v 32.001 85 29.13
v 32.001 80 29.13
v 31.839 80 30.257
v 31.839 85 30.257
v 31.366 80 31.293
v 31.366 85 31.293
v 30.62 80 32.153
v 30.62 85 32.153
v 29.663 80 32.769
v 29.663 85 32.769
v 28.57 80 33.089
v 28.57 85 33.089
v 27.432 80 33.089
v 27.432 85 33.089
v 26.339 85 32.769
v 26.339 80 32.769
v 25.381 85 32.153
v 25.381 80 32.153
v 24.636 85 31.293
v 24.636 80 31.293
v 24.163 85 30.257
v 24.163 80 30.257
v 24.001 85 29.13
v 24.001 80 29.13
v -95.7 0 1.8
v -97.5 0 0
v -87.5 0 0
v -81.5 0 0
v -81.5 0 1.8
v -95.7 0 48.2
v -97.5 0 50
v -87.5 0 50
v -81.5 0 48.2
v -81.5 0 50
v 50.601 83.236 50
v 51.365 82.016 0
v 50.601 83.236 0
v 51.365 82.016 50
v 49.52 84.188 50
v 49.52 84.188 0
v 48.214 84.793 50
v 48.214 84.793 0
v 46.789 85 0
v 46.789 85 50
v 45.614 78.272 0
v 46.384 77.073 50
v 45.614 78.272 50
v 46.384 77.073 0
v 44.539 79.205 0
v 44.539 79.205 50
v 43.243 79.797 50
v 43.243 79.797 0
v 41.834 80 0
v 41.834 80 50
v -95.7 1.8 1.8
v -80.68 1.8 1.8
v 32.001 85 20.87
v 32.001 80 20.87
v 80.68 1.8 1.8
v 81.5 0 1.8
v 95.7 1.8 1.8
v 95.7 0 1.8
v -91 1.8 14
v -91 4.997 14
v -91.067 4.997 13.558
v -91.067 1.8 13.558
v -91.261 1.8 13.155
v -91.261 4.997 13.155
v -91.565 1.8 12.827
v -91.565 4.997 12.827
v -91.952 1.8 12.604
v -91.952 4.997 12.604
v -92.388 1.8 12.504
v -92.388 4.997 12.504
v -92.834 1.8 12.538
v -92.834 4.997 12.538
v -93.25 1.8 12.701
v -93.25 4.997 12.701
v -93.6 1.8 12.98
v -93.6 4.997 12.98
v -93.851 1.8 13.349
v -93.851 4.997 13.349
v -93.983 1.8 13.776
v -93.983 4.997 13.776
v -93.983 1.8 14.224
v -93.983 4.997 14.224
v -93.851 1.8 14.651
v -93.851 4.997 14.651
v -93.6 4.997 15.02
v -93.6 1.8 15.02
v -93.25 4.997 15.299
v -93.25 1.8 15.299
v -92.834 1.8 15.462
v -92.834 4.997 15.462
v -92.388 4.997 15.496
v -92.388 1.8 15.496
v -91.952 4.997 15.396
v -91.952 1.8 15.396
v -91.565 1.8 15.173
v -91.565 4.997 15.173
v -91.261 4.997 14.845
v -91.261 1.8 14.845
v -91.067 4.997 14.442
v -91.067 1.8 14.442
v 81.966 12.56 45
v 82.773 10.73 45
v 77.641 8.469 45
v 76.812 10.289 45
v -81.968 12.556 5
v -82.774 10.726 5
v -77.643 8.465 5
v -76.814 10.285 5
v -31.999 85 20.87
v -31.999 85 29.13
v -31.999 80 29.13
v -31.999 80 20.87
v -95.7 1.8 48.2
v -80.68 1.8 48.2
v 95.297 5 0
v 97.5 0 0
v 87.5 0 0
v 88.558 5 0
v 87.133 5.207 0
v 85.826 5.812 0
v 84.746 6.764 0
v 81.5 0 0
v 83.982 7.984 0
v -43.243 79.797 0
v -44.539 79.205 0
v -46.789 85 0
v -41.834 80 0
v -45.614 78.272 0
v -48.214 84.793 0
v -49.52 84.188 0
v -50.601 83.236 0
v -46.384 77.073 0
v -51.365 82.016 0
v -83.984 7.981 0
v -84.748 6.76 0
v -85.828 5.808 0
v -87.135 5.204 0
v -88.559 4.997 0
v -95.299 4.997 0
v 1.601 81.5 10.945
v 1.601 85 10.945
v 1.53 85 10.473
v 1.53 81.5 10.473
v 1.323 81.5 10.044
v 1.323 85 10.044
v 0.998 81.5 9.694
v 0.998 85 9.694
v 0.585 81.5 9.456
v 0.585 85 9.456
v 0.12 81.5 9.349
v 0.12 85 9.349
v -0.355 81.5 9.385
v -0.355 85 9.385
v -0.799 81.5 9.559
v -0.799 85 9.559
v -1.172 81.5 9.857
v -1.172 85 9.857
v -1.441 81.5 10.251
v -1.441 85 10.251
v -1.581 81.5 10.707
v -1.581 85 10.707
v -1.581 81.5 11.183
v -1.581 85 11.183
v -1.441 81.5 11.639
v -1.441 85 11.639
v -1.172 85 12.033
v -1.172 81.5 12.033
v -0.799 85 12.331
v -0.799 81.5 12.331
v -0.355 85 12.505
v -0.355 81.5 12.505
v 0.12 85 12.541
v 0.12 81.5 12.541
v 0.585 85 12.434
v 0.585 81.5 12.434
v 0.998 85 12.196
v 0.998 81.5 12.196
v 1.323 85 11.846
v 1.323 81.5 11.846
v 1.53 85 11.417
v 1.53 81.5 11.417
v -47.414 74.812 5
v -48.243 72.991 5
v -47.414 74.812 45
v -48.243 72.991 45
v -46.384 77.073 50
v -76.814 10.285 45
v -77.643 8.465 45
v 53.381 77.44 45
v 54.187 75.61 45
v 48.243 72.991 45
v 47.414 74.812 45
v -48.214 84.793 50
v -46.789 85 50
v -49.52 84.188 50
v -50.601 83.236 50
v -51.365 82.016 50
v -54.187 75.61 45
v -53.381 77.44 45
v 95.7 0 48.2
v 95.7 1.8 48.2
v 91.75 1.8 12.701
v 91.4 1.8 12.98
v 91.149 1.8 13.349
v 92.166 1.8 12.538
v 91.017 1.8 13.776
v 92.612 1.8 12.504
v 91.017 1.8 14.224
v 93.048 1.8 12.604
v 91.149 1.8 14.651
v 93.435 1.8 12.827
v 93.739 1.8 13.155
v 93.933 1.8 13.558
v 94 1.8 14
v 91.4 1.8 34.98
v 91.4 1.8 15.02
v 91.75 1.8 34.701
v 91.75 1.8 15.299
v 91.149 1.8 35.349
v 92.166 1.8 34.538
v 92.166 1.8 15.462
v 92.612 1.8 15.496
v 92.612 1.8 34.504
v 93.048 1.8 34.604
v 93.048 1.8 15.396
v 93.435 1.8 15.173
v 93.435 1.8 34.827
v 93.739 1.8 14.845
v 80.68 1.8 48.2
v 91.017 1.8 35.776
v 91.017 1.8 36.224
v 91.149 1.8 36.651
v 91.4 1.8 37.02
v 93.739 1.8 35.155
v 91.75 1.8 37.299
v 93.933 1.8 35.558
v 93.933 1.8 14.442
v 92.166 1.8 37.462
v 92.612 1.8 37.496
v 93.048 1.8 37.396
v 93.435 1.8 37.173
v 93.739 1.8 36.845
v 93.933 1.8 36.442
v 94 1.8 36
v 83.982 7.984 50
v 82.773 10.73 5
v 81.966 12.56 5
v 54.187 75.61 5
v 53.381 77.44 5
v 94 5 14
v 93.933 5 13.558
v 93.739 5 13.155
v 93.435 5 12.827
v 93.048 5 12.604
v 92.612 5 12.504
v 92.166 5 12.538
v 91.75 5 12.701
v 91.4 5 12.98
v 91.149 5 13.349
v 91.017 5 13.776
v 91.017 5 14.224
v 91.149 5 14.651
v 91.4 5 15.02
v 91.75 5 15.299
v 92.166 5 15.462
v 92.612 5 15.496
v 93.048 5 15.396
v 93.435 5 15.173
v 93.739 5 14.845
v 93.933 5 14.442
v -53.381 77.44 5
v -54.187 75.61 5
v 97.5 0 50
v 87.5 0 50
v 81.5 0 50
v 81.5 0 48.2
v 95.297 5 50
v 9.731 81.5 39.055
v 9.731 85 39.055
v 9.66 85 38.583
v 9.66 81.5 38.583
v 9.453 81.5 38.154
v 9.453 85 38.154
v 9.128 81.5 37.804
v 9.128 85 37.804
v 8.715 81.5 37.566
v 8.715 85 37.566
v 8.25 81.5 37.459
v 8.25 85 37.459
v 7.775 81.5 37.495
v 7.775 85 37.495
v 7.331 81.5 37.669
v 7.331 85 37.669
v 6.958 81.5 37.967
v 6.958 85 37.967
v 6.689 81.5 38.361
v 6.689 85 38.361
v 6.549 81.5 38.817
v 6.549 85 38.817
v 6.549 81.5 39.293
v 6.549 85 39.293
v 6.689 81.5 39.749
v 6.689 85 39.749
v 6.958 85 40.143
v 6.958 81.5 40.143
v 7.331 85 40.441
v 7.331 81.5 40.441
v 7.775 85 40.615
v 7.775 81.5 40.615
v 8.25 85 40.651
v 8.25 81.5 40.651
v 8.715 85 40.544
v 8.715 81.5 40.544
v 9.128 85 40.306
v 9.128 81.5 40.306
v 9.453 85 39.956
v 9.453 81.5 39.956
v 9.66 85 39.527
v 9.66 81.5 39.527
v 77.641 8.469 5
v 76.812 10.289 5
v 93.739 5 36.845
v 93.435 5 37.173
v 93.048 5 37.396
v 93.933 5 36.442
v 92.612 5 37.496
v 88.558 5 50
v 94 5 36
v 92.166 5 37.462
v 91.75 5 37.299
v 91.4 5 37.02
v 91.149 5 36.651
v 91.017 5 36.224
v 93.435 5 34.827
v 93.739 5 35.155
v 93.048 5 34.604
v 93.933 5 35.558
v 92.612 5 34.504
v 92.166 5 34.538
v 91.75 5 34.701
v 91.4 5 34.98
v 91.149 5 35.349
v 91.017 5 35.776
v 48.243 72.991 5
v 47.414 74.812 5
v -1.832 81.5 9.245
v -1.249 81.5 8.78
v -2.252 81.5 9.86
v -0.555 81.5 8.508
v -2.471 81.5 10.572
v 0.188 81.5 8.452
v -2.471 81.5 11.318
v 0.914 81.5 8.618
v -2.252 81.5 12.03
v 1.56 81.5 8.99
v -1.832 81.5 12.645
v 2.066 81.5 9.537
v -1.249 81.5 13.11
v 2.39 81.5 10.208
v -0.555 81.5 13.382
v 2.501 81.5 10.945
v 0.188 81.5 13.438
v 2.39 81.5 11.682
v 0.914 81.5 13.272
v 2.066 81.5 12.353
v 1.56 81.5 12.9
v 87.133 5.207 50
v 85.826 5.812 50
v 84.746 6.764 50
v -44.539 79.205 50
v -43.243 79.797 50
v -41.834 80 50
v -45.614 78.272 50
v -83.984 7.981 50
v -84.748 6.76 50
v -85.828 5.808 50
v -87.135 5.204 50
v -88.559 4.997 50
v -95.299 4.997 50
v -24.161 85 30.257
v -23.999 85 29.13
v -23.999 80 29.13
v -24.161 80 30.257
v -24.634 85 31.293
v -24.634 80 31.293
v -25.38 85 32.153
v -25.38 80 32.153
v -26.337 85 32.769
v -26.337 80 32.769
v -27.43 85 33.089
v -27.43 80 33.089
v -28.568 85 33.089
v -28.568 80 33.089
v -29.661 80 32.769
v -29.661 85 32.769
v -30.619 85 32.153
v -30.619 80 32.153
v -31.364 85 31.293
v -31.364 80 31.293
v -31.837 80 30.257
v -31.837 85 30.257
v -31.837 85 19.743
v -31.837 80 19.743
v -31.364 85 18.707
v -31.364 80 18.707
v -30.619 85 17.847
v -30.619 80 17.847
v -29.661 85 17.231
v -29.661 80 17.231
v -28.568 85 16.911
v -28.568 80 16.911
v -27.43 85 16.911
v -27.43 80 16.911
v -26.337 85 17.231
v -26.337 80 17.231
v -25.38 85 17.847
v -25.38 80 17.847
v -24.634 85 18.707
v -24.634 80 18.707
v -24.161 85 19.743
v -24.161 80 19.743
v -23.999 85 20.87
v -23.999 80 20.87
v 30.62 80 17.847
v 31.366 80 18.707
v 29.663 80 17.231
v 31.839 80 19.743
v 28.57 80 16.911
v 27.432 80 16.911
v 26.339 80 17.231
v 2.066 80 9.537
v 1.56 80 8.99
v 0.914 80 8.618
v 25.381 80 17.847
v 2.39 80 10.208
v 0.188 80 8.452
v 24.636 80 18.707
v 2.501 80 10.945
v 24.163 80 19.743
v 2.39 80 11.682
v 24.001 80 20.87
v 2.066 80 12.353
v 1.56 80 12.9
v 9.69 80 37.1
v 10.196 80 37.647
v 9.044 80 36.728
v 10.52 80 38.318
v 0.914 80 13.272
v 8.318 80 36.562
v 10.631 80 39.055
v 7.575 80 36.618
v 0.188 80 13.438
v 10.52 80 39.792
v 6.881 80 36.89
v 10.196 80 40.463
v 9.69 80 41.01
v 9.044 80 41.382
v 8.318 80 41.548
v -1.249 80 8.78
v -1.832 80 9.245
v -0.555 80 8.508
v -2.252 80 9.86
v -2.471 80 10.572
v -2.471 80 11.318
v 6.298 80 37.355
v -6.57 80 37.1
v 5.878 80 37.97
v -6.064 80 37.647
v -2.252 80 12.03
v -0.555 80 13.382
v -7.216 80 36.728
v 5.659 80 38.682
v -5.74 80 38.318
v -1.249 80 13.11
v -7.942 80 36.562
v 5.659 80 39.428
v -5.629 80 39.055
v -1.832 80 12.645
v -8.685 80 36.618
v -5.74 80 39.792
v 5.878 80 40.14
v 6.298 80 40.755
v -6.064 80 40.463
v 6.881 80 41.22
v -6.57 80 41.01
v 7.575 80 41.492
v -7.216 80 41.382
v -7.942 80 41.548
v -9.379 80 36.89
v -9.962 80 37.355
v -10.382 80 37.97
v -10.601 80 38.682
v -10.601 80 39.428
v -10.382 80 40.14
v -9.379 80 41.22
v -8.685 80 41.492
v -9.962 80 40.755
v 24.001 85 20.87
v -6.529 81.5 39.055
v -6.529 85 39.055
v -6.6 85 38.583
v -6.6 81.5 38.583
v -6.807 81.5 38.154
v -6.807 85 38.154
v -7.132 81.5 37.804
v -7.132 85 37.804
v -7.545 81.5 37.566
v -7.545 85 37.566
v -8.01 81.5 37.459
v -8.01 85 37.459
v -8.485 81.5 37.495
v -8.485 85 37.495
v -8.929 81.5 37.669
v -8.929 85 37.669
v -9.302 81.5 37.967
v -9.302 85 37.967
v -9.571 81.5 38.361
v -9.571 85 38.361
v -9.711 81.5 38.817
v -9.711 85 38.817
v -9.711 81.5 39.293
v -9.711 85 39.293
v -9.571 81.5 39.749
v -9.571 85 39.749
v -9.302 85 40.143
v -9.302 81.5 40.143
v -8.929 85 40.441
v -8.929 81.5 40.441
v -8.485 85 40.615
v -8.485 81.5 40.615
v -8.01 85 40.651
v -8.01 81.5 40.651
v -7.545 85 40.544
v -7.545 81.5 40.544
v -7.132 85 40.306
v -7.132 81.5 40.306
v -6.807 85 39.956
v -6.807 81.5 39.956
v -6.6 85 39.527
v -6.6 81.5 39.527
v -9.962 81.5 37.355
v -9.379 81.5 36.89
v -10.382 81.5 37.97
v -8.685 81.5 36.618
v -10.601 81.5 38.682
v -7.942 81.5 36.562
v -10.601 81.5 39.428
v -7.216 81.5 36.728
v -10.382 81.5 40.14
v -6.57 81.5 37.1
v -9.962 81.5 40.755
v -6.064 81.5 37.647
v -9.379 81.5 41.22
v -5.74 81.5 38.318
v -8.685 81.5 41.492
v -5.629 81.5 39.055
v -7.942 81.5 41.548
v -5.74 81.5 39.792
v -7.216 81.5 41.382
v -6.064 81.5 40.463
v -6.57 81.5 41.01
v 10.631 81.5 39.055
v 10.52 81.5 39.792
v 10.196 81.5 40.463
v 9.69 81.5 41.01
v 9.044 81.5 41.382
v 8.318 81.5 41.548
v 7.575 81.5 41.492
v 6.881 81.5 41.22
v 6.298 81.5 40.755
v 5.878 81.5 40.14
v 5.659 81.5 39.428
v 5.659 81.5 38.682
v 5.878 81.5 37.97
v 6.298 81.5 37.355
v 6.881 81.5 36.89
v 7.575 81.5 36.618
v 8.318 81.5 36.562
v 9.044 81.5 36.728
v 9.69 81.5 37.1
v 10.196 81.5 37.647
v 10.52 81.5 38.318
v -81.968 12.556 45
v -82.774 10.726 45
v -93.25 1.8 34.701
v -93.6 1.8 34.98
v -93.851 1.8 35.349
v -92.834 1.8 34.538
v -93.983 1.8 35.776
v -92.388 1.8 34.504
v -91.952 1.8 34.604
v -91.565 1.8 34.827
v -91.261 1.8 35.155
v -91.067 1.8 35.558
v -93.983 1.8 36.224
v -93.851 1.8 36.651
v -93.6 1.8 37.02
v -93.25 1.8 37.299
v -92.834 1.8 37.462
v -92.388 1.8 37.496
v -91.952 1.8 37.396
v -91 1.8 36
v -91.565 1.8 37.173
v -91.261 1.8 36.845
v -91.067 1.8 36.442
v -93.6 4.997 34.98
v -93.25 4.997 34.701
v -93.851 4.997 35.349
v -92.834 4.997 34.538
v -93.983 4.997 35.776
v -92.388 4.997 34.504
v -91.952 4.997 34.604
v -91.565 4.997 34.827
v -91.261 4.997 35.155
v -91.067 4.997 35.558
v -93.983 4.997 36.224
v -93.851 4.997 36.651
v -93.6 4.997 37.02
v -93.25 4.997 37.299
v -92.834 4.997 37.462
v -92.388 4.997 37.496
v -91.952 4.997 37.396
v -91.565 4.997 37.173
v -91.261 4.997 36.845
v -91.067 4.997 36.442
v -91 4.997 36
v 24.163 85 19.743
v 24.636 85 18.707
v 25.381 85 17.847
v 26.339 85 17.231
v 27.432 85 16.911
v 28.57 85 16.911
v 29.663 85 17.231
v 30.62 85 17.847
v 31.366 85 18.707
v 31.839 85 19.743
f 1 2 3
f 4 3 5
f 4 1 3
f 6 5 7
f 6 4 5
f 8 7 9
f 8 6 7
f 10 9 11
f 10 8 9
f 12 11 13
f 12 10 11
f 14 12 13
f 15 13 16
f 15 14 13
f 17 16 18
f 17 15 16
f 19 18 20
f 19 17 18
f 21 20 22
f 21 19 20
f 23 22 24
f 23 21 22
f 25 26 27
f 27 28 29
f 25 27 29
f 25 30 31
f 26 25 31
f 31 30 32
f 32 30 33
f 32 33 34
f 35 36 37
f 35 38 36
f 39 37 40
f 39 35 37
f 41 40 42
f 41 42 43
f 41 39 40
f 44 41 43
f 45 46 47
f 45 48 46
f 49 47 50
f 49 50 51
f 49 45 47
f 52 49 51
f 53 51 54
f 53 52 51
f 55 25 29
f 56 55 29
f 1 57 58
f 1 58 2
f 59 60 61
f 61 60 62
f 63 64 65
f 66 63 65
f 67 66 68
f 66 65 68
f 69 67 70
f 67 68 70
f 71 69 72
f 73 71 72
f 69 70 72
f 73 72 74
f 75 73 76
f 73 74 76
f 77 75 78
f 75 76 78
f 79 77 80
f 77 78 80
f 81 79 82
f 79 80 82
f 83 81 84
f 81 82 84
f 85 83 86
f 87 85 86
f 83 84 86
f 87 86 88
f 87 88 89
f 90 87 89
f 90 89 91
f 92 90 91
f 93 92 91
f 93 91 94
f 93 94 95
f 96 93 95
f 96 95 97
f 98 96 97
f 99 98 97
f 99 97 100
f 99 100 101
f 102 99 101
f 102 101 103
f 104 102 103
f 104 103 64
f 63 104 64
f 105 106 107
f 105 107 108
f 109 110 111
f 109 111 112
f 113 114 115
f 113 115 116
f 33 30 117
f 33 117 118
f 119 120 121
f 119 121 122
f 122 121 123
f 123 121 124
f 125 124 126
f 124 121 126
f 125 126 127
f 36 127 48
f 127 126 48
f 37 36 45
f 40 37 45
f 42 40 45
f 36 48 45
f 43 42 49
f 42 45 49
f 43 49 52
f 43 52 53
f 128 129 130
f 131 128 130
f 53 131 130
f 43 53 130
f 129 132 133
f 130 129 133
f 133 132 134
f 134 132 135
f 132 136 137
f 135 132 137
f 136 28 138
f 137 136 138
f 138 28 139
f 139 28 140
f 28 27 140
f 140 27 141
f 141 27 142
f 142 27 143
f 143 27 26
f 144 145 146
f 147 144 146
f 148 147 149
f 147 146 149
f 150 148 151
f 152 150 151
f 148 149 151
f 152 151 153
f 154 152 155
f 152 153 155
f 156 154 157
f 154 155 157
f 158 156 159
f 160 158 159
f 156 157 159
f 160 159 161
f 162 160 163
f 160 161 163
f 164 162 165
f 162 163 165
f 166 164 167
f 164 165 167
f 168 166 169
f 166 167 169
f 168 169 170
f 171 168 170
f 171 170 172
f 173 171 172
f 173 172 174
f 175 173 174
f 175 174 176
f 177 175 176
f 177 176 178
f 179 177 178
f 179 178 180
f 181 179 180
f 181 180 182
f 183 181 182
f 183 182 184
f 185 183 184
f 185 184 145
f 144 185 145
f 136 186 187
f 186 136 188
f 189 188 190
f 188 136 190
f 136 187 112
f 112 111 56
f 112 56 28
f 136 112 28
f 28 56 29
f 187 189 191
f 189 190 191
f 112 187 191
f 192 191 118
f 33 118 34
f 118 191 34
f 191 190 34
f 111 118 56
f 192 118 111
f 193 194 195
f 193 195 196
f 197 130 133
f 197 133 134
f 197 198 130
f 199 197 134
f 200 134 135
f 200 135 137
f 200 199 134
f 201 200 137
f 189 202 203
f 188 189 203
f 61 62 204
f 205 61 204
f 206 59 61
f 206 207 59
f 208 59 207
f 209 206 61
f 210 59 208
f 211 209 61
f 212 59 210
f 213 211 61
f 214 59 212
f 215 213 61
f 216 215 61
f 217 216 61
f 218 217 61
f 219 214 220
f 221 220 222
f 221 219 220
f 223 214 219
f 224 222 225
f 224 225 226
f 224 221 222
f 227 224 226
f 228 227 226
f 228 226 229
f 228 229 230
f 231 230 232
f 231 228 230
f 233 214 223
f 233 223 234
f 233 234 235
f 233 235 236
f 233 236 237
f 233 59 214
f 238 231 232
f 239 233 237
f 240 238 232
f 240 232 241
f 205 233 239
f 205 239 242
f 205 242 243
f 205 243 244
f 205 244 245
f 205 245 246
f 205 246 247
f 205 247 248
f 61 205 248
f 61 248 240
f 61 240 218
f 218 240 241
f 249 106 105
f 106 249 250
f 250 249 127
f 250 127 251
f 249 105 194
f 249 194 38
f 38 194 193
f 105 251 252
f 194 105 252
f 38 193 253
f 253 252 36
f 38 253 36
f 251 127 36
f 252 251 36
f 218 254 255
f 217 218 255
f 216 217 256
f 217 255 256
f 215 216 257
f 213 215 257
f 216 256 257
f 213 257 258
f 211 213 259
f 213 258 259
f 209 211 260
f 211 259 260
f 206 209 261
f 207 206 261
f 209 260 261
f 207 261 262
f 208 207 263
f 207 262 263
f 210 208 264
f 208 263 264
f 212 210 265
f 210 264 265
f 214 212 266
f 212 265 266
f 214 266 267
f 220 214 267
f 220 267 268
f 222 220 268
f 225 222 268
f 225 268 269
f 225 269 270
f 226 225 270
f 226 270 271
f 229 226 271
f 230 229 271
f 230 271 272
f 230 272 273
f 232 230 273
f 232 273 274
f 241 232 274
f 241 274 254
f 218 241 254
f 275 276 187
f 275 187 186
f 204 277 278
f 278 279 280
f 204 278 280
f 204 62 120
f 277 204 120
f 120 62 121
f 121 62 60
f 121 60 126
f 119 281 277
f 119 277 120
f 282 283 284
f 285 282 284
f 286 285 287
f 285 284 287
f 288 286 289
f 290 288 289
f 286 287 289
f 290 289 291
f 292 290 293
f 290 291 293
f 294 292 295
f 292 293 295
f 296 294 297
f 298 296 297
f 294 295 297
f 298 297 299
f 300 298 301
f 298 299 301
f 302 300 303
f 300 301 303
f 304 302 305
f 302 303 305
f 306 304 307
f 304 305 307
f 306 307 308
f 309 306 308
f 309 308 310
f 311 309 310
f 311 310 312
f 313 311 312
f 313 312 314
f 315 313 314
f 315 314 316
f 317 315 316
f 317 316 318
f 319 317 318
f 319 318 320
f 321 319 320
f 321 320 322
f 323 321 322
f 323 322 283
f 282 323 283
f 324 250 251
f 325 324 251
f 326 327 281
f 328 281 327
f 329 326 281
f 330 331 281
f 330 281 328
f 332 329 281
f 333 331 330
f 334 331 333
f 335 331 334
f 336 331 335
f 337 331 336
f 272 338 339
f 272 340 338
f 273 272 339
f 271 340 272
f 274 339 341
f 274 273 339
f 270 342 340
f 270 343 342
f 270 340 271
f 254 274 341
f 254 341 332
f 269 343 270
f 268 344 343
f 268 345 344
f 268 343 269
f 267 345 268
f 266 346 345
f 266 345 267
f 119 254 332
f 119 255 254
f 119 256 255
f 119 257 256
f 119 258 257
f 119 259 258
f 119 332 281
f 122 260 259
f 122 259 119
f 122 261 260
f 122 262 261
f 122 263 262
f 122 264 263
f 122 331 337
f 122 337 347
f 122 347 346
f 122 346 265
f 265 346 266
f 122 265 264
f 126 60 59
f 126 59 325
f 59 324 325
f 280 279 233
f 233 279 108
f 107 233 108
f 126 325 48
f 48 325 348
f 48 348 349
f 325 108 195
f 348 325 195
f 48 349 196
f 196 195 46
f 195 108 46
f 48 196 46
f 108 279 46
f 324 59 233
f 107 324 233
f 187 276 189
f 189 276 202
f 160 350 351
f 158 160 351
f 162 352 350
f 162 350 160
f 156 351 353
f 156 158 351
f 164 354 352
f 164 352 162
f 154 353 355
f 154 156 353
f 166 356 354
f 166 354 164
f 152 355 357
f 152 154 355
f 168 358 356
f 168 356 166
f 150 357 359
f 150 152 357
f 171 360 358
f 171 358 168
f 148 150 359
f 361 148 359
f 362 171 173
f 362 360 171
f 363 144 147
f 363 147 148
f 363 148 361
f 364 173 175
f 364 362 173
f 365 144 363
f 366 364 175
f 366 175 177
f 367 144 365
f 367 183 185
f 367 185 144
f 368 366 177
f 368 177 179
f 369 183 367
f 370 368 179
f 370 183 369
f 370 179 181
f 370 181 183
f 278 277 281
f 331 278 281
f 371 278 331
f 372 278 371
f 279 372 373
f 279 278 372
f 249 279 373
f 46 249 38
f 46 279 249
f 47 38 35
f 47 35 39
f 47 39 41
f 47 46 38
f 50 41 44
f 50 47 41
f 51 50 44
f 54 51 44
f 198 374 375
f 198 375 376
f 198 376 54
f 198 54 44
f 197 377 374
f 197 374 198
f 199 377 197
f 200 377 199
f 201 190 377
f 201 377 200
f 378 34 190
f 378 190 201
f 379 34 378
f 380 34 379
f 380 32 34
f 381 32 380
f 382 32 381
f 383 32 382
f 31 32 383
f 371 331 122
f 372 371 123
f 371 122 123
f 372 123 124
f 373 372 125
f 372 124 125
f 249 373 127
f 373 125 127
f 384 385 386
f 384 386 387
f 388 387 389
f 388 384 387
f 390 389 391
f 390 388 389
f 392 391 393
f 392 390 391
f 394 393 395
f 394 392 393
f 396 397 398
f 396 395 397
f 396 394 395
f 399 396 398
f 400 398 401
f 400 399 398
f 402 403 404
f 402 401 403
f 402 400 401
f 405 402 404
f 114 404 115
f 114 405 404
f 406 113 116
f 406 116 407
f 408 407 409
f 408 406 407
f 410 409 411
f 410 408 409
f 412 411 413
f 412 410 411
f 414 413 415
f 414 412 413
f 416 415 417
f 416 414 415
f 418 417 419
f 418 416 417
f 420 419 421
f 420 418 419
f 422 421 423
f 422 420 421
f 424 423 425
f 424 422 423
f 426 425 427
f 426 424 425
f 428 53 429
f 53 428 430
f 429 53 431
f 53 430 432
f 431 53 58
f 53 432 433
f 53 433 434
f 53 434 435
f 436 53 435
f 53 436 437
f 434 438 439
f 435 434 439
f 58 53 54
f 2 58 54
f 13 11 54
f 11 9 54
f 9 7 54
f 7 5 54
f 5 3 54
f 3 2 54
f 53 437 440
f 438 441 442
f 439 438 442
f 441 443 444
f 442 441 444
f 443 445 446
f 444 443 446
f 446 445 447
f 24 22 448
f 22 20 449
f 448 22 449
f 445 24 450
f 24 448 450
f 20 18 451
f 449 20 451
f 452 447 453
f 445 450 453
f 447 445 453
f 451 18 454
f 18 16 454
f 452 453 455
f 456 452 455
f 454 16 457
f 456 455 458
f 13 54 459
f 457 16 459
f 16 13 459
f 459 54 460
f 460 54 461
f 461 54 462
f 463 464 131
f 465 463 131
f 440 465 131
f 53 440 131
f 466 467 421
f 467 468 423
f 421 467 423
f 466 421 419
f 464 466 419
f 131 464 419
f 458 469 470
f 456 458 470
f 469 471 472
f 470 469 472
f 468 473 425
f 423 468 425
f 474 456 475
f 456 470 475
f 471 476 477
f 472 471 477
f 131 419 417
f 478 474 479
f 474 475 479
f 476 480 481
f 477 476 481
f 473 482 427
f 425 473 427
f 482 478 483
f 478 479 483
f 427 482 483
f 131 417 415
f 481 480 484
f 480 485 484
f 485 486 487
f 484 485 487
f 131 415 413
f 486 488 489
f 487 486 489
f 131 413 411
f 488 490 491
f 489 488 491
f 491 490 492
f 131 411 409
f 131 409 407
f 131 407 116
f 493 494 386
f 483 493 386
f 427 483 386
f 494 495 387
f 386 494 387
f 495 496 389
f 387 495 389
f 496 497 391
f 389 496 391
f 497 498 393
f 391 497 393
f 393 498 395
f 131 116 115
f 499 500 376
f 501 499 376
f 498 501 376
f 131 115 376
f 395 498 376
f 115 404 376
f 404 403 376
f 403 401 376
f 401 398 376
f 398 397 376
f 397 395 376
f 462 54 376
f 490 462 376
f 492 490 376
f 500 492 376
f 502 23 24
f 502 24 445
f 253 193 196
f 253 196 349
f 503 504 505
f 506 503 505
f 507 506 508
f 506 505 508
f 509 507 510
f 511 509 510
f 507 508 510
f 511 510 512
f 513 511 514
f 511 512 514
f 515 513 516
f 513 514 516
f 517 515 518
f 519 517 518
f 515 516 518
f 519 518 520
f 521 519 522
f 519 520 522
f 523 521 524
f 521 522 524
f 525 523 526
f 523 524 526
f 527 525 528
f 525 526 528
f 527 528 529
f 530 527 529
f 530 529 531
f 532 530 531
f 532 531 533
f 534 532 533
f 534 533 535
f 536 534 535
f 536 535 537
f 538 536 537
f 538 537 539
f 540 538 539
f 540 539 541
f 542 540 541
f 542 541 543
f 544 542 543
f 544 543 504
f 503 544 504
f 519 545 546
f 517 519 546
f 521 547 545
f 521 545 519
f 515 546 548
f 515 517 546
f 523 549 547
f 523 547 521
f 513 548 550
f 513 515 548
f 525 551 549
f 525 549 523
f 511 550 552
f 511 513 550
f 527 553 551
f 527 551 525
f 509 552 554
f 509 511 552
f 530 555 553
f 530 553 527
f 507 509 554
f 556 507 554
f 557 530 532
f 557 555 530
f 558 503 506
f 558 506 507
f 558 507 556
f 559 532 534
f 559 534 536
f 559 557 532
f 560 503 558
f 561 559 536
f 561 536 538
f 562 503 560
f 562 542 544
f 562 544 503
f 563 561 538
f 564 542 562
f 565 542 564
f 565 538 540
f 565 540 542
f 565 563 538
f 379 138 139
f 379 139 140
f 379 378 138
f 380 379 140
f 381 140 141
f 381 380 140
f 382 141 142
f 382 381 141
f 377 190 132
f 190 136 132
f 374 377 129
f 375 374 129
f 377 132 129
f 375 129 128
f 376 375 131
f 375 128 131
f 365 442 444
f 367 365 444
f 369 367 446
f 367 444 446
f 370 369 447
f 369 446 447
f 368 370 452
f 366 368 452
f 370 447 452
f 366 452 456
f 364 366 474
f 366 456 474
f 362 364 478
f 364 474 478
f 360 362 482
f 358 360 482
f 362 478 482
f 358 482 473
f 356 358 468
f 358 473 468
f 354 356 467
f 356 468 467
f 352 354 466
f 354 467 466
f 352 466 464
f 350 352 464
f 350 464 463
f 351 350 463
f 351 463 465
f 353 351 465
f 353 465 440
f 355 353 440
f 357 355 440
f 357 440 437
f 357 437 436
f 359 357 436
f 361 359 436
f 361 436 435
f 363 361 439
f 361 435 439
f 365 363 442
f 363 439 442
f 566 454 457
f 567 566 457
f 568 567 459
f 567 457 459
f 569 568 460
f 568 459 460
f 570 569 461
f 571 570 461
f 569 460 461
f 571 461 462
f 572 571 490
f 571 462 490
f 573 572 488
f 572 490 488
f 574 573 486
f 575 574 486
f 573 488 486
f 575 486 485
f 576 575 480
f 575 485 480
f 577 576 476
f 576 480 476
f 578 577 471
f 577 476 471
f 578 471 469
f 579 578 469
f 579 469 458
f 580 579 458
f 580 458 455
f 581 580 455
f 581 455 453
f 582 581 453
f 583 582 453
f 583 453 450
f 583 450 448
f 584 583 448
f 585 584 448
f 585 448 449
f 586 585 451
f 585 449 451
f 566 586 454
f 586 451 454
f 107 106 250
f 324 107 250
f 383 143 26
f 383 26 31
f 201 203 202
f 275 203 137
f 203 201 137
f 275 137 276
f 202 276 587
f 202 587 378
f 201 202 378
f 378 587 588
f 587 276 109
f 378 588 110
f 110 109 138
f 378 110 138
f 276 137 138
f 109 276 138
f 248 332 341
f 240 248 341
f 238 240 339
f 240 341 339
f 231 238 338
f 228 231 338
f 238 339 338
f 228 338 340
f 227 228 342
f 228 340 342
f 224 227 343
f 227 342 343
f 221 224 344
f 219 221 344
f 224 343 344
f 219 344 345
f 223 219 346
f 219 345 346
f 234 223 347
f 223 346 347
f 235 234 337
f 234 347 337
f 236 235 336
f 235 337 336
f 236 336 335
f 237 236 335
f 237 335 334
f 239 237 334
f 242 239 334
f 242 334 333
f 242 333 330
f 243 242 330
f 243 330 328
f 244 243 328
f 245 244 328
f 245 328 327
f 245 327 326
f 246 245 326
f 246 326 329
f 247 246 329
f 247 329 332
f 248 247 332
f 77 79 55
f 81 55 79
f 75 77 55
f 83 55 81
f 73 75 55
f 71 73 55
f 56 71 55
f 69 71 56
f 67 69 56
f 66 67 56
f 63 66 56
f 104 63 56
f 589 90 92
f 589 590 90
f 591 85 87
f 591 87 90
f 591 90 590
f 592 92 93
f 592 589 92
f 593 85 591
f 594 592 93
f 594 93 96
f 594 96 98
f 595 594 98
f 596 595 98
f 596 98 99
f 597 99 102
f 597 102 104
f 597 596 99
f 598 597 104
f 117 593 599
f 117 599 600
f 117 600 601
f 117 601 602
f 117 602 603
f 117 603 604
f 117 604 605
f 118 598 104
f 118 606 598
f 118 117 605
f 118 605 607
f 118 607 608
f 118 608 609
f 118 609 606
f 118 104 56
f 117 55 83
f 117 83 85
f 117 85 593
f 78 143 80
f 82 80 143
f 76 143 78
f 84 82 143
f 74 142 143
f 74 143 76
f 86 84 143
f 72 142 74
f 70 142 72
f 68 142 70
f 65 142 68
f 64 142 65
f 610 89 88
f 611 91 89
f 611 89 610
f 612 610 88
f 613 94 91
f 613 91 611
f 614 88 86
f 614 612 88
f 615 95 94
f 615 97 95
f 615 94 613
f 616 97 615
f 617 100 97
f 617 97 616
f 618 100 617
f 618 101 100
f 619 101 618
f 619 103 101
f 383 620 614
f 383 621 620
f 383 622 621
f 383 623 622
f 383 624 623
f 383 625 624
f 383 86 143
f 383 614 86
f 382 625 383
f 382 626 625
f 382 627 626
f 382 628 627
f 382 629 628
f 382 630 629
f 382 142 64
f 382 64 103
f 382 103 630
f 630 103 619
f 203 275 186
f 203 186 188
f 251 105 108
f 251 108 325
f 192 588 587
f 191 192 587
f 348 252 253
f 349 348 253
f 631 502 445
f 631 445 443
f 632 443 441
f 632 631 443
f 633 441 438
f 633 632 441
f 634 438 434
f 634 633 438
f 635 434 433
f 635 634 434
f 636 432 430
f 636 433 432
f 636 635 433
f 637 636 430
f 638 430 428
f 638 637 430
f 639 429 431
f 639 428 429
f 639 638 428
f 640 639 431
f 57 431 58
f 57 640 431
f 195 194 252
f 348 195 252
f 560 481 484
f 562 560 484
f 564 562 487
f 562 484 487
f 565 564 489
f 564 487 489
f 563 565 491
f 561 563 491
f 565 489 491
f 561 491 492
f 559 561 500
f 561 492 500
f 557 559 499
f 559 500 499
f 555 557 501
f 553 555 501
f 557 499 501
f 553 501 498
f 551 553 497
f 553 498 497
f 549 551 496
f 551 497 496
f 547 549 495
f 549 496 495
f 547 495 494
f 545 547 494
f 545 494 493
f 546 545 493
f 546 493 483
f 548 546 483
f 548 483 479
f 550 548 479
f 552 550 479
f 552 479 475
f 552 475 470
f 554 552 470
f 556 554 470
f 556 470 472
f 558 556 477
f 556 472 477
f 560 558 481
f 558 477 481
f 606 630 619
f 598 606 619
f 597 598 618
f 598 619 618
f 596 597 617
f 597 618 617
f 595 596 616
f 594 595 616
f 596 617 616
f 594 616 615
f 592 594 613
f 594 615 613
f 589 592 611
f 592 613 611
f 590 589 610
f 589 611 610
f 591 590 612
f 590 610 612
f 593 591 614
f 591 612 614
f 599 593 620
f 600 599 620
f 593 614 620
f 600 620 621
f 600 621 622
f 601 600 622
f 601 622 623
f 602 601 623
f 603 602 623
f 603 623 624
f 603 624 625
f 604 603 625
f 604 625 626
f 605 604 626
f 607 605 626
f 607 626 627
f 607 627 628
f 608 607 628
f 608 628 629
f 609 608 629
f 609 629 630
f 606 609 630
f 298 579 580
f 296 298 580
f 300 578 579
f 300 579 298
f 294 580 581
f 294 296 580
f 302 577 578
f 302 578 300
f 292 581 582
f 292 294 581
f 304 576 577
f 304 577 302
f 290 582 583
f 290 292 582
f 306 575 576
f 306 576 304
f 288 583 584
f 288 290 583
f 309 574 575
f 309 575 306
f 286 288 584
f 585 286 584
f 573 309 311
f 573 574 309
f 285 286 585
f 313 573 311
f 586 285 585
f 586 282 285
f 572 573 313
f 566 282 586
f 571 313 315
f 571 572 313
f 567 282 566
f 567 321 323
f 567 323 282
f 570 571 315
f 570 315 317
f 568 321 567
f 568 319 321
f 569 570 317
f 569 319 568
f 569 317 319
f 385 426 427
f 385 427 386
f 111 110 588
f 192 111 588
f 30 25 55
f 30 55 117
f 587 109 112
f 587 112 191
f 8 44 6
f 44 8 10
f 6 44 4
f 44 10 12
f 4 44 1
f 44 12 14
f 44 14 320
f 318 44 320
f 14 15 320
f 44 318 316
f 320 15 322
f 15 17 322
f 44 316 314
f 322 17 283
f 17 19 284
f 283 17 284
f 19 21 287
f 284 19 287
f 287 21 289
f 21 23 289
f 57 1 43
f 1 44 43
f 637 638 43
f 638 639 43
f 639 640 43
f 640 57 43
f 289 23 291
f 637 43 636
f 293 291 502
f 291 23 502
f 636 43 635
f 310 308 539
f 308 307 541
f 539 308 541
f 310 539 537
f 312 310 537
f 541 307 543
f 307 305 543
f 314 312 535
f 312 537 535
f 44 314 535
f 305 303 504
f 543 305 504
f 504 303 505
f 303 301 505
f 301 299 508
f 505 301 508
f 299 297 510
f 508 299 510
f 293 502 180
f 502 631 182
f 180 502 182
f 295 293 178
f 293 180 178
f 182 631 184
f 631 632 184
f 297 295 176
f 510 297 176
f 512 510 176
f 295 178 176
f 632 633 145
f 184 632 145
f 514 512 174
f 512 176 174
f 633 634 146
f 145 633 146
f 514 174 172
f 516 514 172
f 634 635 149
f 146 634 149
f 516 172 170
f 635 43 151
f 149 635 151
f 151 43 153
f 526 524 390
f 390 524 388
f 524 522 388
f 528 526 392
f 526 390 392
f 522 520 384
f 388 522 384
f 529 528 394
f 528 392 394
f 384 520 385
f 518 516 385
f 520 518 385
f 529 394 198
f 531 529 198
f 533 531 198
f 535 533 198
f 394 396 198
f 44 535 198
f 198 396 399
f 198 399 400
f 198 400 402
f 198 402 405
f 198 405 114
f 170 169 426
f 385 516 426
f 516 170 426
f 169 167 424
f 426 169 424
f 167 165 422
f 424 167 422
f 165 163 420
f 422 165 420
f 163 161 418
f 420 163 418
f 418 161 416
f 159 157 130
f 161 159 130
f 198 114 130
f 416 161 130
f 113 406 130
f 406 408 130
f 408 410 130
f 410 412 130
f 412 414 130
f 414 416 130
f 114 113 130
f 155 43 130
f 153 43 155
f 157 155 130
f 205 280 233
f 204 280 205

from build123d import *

# Parameters (mm, degrees)
BOSS_EXTRUDE2_DEPTH = 50
CUT_EXTRUDE1_DEPTH  = 50
FILLET1_R           = 5
SKETCH10_W          = 50
SKETCH10_H          = 5.46
BOSS_EXTRUDE4_DEPTH = 10
SKETCH5_W           = 50
SKETCH5_H           = 5.464
BOSS_EXTRUDE5_DEPTH = 10
SKETCH11_R          = 1.5
CUT_EXTRUDE2_DEPTH  = 10
SKETCH12_R          = 1.5
CUT_EXTRUDE3_DEPTH  = 10
FILLET2_R           = 5
FILLET3_R           = 5
CUT_EXTRUDE8_DEPTH  = 8.5
SKETCH18_W          = 15.2
SKETCH18_H          = 46.4
CUT_EXTRUDE14_DEPTH = 1.8
SKETCH19_W          = 15.2
SKETCH19_H          = 46.4
CUT_EXTRUDE15_DEPTH = 1.8
SKETCH16_W          = 40
SKETCH16_H          = 2
CUT_EXTRUDE16_DEPTH = 10
SKETCH17_W          = 40
SKETCH17_H          = 2
CUT_EXTRUDE17_DEPTH = 10
SKETCH13_R          = 1.6
CUT_EXTRUDE18_DEPTH = 10
SKETCH20_R          = 2.5
CUT_EXTRUDE19_DEPTH = 1.5


with BuildPart() as part:
    # Sketch1 → Boss-Extrude2 (new body)
    with BuildSketch(Plane.XY):
        Polygon((-87.5, 0), (87.5, 0), (50.05, 85), (-50.05, 85), align=None)
    extrude(amount=BOSS_EXTRUDE2_DEPTH)

    # Sketch3 → Cut-Extrude1 (cut)
    with BuildSketch(Plane.XY.offset(50)):
        Polygon((-81.5, 0), (81.5, 0), (45.05, 80), (-45.05, 80), align=None)
    extrude(amount=-CUT_EXTRUDE1_DEPTH, mode=Mode.SUBTRACT)

    # Fillet1
    fillet1_edges = [part.edges().sort_by_distance(p)[0] for p in [
        (-45.05, 80, 25),
        (45.05, 80, 25),
    ]]
    fillet(fillet1_edges, radius=FILLET1_R)

    # Sketch10 → Boss-Extrude4 (add, along a direction that is not the sketch's normal)
    with BuildSketch(Plane(origin=(-73.275840836, 32.284473404, 0), x_dir=(0, 0, 1), z_dir=(-0.915116485, 0.403189557, 0))):
        with Locations((25, -32.549086253)):
            Rectangle(SKETCH10_W, SKETCH10_H)
    extrude(amount=BOSS_EXTRUDE4_DEPTH, dir=(-1, 0, 0))

    # Sketch5 → Boss-Extrude5 (add, along a direction that is not the sketch's normal)
    with BuildSketch(Plane(origin=(73.275840836, 32.284473404, 0), x_dir=(0, 0, -1), z_dir=(0.915116485, 0.403189557, 0))):
        with Locations((-25, -32.547086253)):
            Rectangle(SKETCH5_W, SKETCH5_H)
    extrude(amount=BOSS_EXTRUDE5_DEPTH, dir=(1, 0, 0))

    # Sketch11 → Cut-Extrude2 (cut)
    with BuildSketch(Plane(origin=(0, 4.996536008, 0), x_dir=(1, 0, 0), z_dir=(0, 1, 0))):
        with Locations((-92.5, -14)):
            Circle(SKETCH11_R)
        with Locations((-92.5, -36)):
            Circle(SKETCH11_R)
    extrude(amount=-CUT_EXTRUDE2_DEPTH, mode=Mode.SUBTRACT)

    # Sketch12 → Cut-Extrude3 (cut)
    with BuildSketch(Plane(origin=(0, 5.000196474, 0), x_dir=(1, 0, 0), z_dir=(0, 1, 0))):
        with Locations((92.5, -14)):
            Circle(SKETCH12_R)
        with Locations((92.5, -36)):
            Circle(SKETCH12_R)
    extrude(amount=-CUT_EXTRUDE3_DEPTH, mode=Mode.SUBTRACT)

    # Fillet2
    fillet2_edges = [part.edges().sort_by_distance(p)[0] for p in [
        (-85.298585018, 4.996536008, 25),
        (85.29697226, 5.000196474, 25),
    ]]
    fillet(fillet2_edges, radius=FILLET2_R)

    # Fillet3
    fillet3_edges = [part.edges().sort_by_distance(p)[0] for p in [
        (-50.05, 85, 25),
        (50.05, 85, 25),
    ]]
    fillet(fillet3_edges, radius=FILLET3_R)

    # Sketch15 → Cut-Extrude8 (cut)
    with BuildSketch(Plane(origin=(0, 85, 0), x_dir=(1, 0, 0), z_dir=(0, 1, 0))):
        with BuildLine():
            Line((-23.999155874, -20.87), (-23.999155874, -29.13))
            ThreePointArc((-23.999155874, -29.13), (-27.999155874, -33.13), (-31.999155874, -29.13))
            Line((-31.999155874, -29.13), (-31.999155874, -20.87))
            ThreePointArc((-31.999155874, -20.87), (-27.999155874, -16.87), (-23.999155874, -20.87))
        make_face()
        with BuildLine():
            Line((32.000844126, -20.87), (32.000844126, -29.13))
            ThreePointArc((32.000844126, -29.13), (28.000844126, -33.13), (24.000844126, -29.13))
            Line((24.000844126, -29.13), (24.000844126, -20.87))
            ThreePointArc((24.000844126, -20.87), (28.000844126, -16.87), (32.000844126, -20.87))
        make_face()
    extrude(amount=-CUT_EXTRUDE8_DEPTH, mode=Mode.SUBTRACT)

    # Sketch18 → Cut-Extrude14 (cut)
    with BuildSketch(Plane.XZ):
        with Locations((88.1, 25)):
            Rectangle(SKETCH18_W, SKETCH18_H)
    extrude(amount=-CUT_EXTRUDE14_DEPTH, mode=Mode.SUBTRACT)

    # Sketch19 → Cut-Extrude15 (cut)
    with BuildSketch(Plane.XZ):
        with Locations((-88.1, 25)):
            Rectangle(SKETCH19_W, SKETCH19_H)
    extrude(amount=-CUT_EXTRUDE15_DEPTH, mode=Mode.SUBTRACT)

    # Sketch16 → Cut-Extrude16 (cut)
    with BuildSketch(Plane(origin=(73.275840836, 32.284473404, 0), x_dir=(0, 0, -1), z_dir=(0.915116485, 0.403189557, 0))):
        with Locations((-25, 48.344419756)):
            Rectangle(SKETCH16_W, SKETCH16_H)
        with Locations((-25, -22.554242128)):
            Rectangle(SKETCH16_W, SKETCH16_H)
    extrude(amount=-CUT_EXTRUDE16_DEPTH, mode=Mode.SUBTRACT)

    # Sketch17 → Cut-Extrude17 (cut)
    with BuildSketch(Plane(origin=(-73.275840836, 32.284473404, 0), x_dir=(0, 0, 1), z_dir=(-0.915116485, 0.403189557, 0))):
        with Locations((25, 48.344419756)):
            Rectangle(SKETCH17_W, SKETCH17_H)
        with Locations((25, -22.558242128)):
            Rectangle(SKETCH17_W, SKETCH17_H)
    extrude(amount=-CUT_EXTRUDE17_DEPTH, mode=Mode.SUBTRACT)

    # Sketch13 → Cut-Extrude18 (cut)
    with BuildSketch(Plane(origin=(0, 85, 0), x_dir=(1, 0, 0), z_dir=(0, 1, 0))):
        with Locations((0.000844126, -10.945)):
            Circle(SKETCH13_R)
        with Locations((-8.129155874, -39.055)):
            Circle(SKETCH13_R)
        with Locations((8.130844126, -39.055)):
            Circle(SKETCH13_R)
    extrude(amount=-CUT_EXTRUDE18_DEPTH, mode=Mode.SUBTRACT)

    # Sketch20 → Cut-Extrude19 (cut)
    with BuildSketch(Plane.XZ.offset(-80)):
        with Locations((-8.129155874, 39.055)):
            Circle(SKETCH20_R)
        with Locations((8.130844126, 39.055)):
            Circle(SKETCH20_R)
        with Locations((0.000844126, 10.945)):
            Circle(SKETCH20_R)
    extrude(amount=-CUT_EXTRUDE19_DEPTH, mode=Mode.SUBTRACT)


solid = part.part
